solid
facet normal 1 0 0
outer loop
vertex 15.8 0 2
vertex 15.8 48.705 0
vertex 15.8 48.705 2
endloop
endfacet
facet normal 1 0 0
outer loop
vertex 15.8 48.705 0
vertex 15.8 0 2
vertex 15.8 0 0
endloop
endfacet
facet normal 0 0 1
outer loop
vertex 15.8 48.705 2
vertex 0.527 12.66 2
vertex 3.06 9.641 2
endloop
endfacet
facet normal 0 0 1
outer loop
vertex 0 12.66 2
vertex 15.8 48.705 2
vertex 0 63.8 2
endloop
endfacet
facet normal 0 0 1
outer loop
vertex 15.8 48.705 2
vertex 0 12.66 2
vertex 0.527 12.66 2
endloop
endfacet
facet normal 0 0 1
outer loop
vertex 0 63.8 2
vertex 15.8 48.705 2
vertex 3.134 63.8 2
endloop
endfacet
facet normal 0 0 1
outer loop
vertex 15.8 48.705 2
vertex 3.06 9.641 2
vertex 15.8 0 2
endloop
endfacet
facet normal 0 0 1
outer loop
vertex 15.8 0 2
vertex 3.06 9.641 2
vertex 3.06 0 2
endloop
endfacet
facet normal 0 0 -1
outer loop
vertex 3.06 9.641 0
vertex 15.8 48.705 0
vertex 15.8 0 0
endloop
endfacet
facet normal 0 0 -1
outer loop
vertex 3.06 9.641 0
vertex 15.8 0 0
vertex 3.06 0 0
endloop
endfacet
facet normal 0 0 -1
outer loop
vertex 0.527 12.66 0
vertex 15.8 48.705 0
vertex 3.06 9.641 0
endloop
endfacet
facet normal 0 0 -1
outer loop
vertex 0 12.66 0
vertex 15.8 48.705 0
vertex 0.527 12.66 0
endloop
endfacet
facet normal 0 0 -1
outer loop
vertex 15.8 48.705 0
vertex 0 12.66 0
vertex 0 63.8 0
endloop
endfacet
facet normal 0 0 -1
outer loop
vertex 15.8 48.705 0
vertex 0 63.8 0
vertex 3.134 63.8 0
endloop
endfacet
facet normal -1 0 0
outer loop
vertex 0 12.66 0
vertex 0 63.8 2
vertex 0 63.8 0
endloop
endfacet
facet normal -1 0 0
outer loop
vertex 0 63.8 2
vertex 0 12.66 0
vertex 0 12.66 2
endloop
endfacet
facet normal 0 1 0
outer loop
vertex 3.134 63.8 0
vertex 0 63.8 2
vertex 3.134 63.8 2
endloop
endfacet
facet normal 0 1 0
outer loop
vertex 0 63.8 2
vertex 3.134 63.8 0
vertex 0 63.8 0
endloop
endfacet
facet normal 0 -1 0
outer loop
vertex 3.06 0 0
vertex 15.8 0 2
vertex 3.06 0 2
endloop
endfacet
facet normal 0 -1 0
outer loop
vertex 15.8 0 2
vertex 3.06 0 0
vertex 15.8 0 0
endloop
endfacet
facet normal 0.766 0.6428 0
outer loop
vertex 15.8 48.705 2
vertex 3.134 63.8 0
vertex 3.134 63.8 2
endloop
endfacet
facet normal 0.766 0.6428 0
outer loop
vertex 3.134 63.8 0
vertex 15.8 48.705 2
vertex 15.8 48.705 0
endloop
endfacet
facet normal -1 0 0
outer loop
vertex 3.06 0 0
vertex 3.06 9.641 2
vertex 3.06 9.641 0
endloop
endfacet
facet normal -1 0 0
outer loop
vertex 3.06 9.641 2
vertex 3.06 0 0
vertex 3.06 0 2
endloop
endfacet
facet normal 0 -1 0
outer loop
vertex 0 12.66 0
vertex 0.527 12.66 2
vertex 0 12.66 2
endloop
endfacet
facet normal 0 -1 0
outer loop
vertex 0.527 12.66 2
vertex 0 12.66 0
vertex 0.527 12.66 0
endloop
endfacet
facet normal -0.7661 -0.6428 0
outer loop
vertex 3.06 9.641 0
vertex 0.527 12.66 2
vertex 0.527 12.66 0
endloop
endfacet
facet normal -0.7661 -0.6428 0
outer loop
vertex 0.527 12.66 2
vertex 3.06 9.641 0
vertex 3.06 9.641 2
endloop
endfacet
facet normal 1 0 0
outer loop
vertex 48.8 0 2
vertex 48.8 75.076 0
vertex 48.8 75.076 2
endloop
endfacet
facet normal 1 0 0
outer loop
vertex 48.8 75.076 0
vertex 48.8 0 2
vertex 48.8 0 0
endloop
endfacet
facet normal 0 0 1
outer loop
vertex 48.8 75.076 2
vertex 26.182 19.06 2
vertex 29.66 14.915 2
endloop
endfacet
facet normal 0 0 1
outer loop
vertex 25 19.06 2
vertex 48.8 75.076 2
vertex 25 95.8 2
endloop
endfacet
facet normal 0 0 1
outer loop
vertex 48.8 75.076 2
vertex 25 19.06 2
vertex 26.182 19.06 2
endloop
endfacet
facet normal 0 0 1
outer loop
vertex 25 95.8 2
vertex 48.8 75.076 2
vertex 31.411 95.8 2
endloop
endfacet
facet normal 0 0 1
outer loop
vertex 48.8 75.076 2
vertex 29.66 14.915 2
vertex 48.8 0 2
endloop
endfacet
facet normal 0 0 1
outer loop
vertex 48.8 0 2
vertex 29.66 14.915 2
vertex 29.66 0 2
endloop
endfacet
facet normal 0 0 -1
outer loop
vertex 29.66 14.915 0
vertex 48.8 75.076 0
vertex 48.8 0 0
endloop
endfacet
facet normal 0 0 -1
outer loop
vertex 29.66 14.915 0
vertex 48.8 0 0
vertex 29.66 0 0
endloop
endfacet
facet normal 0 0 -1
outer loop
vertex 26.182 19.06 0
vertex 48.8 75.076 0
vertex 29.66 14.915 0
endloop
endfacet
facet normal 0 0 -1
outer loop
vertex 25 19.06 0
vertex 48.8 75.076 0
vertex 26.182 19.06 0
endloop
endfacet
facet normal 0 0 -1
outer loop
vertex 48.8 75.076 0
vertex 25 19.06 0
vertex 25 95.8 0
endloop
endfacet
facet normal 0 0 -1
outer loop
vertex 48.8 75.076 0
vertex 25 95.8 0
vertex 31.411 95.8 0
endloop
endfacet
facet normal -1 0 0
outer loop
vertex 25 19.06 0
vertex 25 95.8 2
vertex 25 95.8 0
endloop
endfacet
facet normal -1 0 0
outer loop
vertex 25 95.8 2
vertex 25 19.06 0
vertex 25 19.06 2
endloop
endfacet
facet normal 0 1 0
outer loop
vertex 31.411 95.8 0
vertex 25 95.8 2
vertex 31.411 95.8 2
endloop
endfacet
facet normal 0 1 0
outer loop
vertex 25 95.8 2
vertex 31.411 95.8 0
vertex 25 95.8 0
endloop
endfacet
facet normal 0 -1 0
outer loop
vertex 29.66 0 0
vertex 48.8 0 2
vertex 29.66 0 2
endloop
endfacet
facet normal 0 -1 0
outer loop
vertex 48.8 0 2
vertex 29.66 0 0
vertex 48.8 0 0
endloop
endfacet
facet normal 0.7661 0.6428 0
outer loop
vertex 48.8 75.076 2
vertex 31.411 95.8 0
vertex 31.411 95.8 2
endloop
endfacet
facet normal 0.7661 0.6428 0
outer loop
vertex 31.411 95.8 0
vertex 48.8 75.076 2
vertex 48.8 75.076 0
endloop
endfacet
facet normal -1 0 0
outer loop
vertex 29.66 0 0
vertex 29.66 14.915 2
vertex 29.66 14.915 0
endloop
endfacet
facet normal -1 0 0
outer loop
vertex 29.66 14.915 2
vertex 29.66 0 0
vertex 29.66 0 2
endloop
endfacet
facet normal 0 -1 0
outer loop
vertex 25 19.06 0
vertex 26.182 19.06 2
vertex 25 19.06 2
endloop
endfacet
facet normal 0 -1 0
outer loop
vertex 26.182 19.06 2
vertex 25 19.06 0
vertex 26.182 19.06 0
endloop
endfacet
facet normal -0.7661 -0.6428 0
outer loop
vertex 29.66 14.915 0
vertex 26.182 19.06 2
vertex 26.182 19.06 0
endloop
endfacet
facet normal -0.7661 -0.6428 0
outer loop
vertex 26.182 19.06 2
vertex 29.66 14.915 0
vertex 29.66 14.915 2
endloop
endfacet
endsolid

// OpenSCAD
// LEGO constants
$stud_interval = 8; //mm
$P = $stud_interval;
$short_brick_h = 3.2; //mm
$tall_brick_h = 9.6; //mm

function brick_dimension(studs) = ($P * studs) - 0.2;

// Instrument Shape Constants
$wood_h = 3.125;

module inside_stop_shape () {
    $width = 2;
    $reach = 8;

    $trans_w = $width * 1.25;
    $trans_reach = $reach / 1.45;
    
    difference() {
        cube([brick_dimension($width),
              brick_dimension($reach),
              2],
            false);
        translate([brick_dimension($trans_w),           
                   brick_dimension($trans_reach),-1]) {
            rotate([0,0,40]) {
                cube([30, 30, 4]);
            }
        }
    }
}

module outside_stop_shape () {
    $width = 3;
    $reach = 12;

    $trans_w = $width * 1.05;
    $trans_reach = $reach / 1.3;
    
    difference() {
        cube([brick_dimension($width),
              brick_dimension($reach),
              2],
            false);
        translate([brick_dimension($trans_w),           
                   brick_dimension($trans_reach),-1]) {
            rotate([0,0,40]) {
                cube([30, 30, 4]);
            }
        }
    }
}


module inside_stop_bar() {
    difference() {
        inside_stop_shape();
        translate([-0.1,-0.1,-1]) {
            scale([0.2,0.2,2]) inside_stop_shape();    
        }
    }
}

module outside_stop_bar() {
    difference() {
        outside_stop_shape();
        translate([-0.1,-0.1,-1]) {
            scale([0.2,0.2,2]) outside_stop_shape();    
        }
    }
}

inside_stop_bar();

translate([25, 0, 0]) {
    outside_stop_bar();
}
